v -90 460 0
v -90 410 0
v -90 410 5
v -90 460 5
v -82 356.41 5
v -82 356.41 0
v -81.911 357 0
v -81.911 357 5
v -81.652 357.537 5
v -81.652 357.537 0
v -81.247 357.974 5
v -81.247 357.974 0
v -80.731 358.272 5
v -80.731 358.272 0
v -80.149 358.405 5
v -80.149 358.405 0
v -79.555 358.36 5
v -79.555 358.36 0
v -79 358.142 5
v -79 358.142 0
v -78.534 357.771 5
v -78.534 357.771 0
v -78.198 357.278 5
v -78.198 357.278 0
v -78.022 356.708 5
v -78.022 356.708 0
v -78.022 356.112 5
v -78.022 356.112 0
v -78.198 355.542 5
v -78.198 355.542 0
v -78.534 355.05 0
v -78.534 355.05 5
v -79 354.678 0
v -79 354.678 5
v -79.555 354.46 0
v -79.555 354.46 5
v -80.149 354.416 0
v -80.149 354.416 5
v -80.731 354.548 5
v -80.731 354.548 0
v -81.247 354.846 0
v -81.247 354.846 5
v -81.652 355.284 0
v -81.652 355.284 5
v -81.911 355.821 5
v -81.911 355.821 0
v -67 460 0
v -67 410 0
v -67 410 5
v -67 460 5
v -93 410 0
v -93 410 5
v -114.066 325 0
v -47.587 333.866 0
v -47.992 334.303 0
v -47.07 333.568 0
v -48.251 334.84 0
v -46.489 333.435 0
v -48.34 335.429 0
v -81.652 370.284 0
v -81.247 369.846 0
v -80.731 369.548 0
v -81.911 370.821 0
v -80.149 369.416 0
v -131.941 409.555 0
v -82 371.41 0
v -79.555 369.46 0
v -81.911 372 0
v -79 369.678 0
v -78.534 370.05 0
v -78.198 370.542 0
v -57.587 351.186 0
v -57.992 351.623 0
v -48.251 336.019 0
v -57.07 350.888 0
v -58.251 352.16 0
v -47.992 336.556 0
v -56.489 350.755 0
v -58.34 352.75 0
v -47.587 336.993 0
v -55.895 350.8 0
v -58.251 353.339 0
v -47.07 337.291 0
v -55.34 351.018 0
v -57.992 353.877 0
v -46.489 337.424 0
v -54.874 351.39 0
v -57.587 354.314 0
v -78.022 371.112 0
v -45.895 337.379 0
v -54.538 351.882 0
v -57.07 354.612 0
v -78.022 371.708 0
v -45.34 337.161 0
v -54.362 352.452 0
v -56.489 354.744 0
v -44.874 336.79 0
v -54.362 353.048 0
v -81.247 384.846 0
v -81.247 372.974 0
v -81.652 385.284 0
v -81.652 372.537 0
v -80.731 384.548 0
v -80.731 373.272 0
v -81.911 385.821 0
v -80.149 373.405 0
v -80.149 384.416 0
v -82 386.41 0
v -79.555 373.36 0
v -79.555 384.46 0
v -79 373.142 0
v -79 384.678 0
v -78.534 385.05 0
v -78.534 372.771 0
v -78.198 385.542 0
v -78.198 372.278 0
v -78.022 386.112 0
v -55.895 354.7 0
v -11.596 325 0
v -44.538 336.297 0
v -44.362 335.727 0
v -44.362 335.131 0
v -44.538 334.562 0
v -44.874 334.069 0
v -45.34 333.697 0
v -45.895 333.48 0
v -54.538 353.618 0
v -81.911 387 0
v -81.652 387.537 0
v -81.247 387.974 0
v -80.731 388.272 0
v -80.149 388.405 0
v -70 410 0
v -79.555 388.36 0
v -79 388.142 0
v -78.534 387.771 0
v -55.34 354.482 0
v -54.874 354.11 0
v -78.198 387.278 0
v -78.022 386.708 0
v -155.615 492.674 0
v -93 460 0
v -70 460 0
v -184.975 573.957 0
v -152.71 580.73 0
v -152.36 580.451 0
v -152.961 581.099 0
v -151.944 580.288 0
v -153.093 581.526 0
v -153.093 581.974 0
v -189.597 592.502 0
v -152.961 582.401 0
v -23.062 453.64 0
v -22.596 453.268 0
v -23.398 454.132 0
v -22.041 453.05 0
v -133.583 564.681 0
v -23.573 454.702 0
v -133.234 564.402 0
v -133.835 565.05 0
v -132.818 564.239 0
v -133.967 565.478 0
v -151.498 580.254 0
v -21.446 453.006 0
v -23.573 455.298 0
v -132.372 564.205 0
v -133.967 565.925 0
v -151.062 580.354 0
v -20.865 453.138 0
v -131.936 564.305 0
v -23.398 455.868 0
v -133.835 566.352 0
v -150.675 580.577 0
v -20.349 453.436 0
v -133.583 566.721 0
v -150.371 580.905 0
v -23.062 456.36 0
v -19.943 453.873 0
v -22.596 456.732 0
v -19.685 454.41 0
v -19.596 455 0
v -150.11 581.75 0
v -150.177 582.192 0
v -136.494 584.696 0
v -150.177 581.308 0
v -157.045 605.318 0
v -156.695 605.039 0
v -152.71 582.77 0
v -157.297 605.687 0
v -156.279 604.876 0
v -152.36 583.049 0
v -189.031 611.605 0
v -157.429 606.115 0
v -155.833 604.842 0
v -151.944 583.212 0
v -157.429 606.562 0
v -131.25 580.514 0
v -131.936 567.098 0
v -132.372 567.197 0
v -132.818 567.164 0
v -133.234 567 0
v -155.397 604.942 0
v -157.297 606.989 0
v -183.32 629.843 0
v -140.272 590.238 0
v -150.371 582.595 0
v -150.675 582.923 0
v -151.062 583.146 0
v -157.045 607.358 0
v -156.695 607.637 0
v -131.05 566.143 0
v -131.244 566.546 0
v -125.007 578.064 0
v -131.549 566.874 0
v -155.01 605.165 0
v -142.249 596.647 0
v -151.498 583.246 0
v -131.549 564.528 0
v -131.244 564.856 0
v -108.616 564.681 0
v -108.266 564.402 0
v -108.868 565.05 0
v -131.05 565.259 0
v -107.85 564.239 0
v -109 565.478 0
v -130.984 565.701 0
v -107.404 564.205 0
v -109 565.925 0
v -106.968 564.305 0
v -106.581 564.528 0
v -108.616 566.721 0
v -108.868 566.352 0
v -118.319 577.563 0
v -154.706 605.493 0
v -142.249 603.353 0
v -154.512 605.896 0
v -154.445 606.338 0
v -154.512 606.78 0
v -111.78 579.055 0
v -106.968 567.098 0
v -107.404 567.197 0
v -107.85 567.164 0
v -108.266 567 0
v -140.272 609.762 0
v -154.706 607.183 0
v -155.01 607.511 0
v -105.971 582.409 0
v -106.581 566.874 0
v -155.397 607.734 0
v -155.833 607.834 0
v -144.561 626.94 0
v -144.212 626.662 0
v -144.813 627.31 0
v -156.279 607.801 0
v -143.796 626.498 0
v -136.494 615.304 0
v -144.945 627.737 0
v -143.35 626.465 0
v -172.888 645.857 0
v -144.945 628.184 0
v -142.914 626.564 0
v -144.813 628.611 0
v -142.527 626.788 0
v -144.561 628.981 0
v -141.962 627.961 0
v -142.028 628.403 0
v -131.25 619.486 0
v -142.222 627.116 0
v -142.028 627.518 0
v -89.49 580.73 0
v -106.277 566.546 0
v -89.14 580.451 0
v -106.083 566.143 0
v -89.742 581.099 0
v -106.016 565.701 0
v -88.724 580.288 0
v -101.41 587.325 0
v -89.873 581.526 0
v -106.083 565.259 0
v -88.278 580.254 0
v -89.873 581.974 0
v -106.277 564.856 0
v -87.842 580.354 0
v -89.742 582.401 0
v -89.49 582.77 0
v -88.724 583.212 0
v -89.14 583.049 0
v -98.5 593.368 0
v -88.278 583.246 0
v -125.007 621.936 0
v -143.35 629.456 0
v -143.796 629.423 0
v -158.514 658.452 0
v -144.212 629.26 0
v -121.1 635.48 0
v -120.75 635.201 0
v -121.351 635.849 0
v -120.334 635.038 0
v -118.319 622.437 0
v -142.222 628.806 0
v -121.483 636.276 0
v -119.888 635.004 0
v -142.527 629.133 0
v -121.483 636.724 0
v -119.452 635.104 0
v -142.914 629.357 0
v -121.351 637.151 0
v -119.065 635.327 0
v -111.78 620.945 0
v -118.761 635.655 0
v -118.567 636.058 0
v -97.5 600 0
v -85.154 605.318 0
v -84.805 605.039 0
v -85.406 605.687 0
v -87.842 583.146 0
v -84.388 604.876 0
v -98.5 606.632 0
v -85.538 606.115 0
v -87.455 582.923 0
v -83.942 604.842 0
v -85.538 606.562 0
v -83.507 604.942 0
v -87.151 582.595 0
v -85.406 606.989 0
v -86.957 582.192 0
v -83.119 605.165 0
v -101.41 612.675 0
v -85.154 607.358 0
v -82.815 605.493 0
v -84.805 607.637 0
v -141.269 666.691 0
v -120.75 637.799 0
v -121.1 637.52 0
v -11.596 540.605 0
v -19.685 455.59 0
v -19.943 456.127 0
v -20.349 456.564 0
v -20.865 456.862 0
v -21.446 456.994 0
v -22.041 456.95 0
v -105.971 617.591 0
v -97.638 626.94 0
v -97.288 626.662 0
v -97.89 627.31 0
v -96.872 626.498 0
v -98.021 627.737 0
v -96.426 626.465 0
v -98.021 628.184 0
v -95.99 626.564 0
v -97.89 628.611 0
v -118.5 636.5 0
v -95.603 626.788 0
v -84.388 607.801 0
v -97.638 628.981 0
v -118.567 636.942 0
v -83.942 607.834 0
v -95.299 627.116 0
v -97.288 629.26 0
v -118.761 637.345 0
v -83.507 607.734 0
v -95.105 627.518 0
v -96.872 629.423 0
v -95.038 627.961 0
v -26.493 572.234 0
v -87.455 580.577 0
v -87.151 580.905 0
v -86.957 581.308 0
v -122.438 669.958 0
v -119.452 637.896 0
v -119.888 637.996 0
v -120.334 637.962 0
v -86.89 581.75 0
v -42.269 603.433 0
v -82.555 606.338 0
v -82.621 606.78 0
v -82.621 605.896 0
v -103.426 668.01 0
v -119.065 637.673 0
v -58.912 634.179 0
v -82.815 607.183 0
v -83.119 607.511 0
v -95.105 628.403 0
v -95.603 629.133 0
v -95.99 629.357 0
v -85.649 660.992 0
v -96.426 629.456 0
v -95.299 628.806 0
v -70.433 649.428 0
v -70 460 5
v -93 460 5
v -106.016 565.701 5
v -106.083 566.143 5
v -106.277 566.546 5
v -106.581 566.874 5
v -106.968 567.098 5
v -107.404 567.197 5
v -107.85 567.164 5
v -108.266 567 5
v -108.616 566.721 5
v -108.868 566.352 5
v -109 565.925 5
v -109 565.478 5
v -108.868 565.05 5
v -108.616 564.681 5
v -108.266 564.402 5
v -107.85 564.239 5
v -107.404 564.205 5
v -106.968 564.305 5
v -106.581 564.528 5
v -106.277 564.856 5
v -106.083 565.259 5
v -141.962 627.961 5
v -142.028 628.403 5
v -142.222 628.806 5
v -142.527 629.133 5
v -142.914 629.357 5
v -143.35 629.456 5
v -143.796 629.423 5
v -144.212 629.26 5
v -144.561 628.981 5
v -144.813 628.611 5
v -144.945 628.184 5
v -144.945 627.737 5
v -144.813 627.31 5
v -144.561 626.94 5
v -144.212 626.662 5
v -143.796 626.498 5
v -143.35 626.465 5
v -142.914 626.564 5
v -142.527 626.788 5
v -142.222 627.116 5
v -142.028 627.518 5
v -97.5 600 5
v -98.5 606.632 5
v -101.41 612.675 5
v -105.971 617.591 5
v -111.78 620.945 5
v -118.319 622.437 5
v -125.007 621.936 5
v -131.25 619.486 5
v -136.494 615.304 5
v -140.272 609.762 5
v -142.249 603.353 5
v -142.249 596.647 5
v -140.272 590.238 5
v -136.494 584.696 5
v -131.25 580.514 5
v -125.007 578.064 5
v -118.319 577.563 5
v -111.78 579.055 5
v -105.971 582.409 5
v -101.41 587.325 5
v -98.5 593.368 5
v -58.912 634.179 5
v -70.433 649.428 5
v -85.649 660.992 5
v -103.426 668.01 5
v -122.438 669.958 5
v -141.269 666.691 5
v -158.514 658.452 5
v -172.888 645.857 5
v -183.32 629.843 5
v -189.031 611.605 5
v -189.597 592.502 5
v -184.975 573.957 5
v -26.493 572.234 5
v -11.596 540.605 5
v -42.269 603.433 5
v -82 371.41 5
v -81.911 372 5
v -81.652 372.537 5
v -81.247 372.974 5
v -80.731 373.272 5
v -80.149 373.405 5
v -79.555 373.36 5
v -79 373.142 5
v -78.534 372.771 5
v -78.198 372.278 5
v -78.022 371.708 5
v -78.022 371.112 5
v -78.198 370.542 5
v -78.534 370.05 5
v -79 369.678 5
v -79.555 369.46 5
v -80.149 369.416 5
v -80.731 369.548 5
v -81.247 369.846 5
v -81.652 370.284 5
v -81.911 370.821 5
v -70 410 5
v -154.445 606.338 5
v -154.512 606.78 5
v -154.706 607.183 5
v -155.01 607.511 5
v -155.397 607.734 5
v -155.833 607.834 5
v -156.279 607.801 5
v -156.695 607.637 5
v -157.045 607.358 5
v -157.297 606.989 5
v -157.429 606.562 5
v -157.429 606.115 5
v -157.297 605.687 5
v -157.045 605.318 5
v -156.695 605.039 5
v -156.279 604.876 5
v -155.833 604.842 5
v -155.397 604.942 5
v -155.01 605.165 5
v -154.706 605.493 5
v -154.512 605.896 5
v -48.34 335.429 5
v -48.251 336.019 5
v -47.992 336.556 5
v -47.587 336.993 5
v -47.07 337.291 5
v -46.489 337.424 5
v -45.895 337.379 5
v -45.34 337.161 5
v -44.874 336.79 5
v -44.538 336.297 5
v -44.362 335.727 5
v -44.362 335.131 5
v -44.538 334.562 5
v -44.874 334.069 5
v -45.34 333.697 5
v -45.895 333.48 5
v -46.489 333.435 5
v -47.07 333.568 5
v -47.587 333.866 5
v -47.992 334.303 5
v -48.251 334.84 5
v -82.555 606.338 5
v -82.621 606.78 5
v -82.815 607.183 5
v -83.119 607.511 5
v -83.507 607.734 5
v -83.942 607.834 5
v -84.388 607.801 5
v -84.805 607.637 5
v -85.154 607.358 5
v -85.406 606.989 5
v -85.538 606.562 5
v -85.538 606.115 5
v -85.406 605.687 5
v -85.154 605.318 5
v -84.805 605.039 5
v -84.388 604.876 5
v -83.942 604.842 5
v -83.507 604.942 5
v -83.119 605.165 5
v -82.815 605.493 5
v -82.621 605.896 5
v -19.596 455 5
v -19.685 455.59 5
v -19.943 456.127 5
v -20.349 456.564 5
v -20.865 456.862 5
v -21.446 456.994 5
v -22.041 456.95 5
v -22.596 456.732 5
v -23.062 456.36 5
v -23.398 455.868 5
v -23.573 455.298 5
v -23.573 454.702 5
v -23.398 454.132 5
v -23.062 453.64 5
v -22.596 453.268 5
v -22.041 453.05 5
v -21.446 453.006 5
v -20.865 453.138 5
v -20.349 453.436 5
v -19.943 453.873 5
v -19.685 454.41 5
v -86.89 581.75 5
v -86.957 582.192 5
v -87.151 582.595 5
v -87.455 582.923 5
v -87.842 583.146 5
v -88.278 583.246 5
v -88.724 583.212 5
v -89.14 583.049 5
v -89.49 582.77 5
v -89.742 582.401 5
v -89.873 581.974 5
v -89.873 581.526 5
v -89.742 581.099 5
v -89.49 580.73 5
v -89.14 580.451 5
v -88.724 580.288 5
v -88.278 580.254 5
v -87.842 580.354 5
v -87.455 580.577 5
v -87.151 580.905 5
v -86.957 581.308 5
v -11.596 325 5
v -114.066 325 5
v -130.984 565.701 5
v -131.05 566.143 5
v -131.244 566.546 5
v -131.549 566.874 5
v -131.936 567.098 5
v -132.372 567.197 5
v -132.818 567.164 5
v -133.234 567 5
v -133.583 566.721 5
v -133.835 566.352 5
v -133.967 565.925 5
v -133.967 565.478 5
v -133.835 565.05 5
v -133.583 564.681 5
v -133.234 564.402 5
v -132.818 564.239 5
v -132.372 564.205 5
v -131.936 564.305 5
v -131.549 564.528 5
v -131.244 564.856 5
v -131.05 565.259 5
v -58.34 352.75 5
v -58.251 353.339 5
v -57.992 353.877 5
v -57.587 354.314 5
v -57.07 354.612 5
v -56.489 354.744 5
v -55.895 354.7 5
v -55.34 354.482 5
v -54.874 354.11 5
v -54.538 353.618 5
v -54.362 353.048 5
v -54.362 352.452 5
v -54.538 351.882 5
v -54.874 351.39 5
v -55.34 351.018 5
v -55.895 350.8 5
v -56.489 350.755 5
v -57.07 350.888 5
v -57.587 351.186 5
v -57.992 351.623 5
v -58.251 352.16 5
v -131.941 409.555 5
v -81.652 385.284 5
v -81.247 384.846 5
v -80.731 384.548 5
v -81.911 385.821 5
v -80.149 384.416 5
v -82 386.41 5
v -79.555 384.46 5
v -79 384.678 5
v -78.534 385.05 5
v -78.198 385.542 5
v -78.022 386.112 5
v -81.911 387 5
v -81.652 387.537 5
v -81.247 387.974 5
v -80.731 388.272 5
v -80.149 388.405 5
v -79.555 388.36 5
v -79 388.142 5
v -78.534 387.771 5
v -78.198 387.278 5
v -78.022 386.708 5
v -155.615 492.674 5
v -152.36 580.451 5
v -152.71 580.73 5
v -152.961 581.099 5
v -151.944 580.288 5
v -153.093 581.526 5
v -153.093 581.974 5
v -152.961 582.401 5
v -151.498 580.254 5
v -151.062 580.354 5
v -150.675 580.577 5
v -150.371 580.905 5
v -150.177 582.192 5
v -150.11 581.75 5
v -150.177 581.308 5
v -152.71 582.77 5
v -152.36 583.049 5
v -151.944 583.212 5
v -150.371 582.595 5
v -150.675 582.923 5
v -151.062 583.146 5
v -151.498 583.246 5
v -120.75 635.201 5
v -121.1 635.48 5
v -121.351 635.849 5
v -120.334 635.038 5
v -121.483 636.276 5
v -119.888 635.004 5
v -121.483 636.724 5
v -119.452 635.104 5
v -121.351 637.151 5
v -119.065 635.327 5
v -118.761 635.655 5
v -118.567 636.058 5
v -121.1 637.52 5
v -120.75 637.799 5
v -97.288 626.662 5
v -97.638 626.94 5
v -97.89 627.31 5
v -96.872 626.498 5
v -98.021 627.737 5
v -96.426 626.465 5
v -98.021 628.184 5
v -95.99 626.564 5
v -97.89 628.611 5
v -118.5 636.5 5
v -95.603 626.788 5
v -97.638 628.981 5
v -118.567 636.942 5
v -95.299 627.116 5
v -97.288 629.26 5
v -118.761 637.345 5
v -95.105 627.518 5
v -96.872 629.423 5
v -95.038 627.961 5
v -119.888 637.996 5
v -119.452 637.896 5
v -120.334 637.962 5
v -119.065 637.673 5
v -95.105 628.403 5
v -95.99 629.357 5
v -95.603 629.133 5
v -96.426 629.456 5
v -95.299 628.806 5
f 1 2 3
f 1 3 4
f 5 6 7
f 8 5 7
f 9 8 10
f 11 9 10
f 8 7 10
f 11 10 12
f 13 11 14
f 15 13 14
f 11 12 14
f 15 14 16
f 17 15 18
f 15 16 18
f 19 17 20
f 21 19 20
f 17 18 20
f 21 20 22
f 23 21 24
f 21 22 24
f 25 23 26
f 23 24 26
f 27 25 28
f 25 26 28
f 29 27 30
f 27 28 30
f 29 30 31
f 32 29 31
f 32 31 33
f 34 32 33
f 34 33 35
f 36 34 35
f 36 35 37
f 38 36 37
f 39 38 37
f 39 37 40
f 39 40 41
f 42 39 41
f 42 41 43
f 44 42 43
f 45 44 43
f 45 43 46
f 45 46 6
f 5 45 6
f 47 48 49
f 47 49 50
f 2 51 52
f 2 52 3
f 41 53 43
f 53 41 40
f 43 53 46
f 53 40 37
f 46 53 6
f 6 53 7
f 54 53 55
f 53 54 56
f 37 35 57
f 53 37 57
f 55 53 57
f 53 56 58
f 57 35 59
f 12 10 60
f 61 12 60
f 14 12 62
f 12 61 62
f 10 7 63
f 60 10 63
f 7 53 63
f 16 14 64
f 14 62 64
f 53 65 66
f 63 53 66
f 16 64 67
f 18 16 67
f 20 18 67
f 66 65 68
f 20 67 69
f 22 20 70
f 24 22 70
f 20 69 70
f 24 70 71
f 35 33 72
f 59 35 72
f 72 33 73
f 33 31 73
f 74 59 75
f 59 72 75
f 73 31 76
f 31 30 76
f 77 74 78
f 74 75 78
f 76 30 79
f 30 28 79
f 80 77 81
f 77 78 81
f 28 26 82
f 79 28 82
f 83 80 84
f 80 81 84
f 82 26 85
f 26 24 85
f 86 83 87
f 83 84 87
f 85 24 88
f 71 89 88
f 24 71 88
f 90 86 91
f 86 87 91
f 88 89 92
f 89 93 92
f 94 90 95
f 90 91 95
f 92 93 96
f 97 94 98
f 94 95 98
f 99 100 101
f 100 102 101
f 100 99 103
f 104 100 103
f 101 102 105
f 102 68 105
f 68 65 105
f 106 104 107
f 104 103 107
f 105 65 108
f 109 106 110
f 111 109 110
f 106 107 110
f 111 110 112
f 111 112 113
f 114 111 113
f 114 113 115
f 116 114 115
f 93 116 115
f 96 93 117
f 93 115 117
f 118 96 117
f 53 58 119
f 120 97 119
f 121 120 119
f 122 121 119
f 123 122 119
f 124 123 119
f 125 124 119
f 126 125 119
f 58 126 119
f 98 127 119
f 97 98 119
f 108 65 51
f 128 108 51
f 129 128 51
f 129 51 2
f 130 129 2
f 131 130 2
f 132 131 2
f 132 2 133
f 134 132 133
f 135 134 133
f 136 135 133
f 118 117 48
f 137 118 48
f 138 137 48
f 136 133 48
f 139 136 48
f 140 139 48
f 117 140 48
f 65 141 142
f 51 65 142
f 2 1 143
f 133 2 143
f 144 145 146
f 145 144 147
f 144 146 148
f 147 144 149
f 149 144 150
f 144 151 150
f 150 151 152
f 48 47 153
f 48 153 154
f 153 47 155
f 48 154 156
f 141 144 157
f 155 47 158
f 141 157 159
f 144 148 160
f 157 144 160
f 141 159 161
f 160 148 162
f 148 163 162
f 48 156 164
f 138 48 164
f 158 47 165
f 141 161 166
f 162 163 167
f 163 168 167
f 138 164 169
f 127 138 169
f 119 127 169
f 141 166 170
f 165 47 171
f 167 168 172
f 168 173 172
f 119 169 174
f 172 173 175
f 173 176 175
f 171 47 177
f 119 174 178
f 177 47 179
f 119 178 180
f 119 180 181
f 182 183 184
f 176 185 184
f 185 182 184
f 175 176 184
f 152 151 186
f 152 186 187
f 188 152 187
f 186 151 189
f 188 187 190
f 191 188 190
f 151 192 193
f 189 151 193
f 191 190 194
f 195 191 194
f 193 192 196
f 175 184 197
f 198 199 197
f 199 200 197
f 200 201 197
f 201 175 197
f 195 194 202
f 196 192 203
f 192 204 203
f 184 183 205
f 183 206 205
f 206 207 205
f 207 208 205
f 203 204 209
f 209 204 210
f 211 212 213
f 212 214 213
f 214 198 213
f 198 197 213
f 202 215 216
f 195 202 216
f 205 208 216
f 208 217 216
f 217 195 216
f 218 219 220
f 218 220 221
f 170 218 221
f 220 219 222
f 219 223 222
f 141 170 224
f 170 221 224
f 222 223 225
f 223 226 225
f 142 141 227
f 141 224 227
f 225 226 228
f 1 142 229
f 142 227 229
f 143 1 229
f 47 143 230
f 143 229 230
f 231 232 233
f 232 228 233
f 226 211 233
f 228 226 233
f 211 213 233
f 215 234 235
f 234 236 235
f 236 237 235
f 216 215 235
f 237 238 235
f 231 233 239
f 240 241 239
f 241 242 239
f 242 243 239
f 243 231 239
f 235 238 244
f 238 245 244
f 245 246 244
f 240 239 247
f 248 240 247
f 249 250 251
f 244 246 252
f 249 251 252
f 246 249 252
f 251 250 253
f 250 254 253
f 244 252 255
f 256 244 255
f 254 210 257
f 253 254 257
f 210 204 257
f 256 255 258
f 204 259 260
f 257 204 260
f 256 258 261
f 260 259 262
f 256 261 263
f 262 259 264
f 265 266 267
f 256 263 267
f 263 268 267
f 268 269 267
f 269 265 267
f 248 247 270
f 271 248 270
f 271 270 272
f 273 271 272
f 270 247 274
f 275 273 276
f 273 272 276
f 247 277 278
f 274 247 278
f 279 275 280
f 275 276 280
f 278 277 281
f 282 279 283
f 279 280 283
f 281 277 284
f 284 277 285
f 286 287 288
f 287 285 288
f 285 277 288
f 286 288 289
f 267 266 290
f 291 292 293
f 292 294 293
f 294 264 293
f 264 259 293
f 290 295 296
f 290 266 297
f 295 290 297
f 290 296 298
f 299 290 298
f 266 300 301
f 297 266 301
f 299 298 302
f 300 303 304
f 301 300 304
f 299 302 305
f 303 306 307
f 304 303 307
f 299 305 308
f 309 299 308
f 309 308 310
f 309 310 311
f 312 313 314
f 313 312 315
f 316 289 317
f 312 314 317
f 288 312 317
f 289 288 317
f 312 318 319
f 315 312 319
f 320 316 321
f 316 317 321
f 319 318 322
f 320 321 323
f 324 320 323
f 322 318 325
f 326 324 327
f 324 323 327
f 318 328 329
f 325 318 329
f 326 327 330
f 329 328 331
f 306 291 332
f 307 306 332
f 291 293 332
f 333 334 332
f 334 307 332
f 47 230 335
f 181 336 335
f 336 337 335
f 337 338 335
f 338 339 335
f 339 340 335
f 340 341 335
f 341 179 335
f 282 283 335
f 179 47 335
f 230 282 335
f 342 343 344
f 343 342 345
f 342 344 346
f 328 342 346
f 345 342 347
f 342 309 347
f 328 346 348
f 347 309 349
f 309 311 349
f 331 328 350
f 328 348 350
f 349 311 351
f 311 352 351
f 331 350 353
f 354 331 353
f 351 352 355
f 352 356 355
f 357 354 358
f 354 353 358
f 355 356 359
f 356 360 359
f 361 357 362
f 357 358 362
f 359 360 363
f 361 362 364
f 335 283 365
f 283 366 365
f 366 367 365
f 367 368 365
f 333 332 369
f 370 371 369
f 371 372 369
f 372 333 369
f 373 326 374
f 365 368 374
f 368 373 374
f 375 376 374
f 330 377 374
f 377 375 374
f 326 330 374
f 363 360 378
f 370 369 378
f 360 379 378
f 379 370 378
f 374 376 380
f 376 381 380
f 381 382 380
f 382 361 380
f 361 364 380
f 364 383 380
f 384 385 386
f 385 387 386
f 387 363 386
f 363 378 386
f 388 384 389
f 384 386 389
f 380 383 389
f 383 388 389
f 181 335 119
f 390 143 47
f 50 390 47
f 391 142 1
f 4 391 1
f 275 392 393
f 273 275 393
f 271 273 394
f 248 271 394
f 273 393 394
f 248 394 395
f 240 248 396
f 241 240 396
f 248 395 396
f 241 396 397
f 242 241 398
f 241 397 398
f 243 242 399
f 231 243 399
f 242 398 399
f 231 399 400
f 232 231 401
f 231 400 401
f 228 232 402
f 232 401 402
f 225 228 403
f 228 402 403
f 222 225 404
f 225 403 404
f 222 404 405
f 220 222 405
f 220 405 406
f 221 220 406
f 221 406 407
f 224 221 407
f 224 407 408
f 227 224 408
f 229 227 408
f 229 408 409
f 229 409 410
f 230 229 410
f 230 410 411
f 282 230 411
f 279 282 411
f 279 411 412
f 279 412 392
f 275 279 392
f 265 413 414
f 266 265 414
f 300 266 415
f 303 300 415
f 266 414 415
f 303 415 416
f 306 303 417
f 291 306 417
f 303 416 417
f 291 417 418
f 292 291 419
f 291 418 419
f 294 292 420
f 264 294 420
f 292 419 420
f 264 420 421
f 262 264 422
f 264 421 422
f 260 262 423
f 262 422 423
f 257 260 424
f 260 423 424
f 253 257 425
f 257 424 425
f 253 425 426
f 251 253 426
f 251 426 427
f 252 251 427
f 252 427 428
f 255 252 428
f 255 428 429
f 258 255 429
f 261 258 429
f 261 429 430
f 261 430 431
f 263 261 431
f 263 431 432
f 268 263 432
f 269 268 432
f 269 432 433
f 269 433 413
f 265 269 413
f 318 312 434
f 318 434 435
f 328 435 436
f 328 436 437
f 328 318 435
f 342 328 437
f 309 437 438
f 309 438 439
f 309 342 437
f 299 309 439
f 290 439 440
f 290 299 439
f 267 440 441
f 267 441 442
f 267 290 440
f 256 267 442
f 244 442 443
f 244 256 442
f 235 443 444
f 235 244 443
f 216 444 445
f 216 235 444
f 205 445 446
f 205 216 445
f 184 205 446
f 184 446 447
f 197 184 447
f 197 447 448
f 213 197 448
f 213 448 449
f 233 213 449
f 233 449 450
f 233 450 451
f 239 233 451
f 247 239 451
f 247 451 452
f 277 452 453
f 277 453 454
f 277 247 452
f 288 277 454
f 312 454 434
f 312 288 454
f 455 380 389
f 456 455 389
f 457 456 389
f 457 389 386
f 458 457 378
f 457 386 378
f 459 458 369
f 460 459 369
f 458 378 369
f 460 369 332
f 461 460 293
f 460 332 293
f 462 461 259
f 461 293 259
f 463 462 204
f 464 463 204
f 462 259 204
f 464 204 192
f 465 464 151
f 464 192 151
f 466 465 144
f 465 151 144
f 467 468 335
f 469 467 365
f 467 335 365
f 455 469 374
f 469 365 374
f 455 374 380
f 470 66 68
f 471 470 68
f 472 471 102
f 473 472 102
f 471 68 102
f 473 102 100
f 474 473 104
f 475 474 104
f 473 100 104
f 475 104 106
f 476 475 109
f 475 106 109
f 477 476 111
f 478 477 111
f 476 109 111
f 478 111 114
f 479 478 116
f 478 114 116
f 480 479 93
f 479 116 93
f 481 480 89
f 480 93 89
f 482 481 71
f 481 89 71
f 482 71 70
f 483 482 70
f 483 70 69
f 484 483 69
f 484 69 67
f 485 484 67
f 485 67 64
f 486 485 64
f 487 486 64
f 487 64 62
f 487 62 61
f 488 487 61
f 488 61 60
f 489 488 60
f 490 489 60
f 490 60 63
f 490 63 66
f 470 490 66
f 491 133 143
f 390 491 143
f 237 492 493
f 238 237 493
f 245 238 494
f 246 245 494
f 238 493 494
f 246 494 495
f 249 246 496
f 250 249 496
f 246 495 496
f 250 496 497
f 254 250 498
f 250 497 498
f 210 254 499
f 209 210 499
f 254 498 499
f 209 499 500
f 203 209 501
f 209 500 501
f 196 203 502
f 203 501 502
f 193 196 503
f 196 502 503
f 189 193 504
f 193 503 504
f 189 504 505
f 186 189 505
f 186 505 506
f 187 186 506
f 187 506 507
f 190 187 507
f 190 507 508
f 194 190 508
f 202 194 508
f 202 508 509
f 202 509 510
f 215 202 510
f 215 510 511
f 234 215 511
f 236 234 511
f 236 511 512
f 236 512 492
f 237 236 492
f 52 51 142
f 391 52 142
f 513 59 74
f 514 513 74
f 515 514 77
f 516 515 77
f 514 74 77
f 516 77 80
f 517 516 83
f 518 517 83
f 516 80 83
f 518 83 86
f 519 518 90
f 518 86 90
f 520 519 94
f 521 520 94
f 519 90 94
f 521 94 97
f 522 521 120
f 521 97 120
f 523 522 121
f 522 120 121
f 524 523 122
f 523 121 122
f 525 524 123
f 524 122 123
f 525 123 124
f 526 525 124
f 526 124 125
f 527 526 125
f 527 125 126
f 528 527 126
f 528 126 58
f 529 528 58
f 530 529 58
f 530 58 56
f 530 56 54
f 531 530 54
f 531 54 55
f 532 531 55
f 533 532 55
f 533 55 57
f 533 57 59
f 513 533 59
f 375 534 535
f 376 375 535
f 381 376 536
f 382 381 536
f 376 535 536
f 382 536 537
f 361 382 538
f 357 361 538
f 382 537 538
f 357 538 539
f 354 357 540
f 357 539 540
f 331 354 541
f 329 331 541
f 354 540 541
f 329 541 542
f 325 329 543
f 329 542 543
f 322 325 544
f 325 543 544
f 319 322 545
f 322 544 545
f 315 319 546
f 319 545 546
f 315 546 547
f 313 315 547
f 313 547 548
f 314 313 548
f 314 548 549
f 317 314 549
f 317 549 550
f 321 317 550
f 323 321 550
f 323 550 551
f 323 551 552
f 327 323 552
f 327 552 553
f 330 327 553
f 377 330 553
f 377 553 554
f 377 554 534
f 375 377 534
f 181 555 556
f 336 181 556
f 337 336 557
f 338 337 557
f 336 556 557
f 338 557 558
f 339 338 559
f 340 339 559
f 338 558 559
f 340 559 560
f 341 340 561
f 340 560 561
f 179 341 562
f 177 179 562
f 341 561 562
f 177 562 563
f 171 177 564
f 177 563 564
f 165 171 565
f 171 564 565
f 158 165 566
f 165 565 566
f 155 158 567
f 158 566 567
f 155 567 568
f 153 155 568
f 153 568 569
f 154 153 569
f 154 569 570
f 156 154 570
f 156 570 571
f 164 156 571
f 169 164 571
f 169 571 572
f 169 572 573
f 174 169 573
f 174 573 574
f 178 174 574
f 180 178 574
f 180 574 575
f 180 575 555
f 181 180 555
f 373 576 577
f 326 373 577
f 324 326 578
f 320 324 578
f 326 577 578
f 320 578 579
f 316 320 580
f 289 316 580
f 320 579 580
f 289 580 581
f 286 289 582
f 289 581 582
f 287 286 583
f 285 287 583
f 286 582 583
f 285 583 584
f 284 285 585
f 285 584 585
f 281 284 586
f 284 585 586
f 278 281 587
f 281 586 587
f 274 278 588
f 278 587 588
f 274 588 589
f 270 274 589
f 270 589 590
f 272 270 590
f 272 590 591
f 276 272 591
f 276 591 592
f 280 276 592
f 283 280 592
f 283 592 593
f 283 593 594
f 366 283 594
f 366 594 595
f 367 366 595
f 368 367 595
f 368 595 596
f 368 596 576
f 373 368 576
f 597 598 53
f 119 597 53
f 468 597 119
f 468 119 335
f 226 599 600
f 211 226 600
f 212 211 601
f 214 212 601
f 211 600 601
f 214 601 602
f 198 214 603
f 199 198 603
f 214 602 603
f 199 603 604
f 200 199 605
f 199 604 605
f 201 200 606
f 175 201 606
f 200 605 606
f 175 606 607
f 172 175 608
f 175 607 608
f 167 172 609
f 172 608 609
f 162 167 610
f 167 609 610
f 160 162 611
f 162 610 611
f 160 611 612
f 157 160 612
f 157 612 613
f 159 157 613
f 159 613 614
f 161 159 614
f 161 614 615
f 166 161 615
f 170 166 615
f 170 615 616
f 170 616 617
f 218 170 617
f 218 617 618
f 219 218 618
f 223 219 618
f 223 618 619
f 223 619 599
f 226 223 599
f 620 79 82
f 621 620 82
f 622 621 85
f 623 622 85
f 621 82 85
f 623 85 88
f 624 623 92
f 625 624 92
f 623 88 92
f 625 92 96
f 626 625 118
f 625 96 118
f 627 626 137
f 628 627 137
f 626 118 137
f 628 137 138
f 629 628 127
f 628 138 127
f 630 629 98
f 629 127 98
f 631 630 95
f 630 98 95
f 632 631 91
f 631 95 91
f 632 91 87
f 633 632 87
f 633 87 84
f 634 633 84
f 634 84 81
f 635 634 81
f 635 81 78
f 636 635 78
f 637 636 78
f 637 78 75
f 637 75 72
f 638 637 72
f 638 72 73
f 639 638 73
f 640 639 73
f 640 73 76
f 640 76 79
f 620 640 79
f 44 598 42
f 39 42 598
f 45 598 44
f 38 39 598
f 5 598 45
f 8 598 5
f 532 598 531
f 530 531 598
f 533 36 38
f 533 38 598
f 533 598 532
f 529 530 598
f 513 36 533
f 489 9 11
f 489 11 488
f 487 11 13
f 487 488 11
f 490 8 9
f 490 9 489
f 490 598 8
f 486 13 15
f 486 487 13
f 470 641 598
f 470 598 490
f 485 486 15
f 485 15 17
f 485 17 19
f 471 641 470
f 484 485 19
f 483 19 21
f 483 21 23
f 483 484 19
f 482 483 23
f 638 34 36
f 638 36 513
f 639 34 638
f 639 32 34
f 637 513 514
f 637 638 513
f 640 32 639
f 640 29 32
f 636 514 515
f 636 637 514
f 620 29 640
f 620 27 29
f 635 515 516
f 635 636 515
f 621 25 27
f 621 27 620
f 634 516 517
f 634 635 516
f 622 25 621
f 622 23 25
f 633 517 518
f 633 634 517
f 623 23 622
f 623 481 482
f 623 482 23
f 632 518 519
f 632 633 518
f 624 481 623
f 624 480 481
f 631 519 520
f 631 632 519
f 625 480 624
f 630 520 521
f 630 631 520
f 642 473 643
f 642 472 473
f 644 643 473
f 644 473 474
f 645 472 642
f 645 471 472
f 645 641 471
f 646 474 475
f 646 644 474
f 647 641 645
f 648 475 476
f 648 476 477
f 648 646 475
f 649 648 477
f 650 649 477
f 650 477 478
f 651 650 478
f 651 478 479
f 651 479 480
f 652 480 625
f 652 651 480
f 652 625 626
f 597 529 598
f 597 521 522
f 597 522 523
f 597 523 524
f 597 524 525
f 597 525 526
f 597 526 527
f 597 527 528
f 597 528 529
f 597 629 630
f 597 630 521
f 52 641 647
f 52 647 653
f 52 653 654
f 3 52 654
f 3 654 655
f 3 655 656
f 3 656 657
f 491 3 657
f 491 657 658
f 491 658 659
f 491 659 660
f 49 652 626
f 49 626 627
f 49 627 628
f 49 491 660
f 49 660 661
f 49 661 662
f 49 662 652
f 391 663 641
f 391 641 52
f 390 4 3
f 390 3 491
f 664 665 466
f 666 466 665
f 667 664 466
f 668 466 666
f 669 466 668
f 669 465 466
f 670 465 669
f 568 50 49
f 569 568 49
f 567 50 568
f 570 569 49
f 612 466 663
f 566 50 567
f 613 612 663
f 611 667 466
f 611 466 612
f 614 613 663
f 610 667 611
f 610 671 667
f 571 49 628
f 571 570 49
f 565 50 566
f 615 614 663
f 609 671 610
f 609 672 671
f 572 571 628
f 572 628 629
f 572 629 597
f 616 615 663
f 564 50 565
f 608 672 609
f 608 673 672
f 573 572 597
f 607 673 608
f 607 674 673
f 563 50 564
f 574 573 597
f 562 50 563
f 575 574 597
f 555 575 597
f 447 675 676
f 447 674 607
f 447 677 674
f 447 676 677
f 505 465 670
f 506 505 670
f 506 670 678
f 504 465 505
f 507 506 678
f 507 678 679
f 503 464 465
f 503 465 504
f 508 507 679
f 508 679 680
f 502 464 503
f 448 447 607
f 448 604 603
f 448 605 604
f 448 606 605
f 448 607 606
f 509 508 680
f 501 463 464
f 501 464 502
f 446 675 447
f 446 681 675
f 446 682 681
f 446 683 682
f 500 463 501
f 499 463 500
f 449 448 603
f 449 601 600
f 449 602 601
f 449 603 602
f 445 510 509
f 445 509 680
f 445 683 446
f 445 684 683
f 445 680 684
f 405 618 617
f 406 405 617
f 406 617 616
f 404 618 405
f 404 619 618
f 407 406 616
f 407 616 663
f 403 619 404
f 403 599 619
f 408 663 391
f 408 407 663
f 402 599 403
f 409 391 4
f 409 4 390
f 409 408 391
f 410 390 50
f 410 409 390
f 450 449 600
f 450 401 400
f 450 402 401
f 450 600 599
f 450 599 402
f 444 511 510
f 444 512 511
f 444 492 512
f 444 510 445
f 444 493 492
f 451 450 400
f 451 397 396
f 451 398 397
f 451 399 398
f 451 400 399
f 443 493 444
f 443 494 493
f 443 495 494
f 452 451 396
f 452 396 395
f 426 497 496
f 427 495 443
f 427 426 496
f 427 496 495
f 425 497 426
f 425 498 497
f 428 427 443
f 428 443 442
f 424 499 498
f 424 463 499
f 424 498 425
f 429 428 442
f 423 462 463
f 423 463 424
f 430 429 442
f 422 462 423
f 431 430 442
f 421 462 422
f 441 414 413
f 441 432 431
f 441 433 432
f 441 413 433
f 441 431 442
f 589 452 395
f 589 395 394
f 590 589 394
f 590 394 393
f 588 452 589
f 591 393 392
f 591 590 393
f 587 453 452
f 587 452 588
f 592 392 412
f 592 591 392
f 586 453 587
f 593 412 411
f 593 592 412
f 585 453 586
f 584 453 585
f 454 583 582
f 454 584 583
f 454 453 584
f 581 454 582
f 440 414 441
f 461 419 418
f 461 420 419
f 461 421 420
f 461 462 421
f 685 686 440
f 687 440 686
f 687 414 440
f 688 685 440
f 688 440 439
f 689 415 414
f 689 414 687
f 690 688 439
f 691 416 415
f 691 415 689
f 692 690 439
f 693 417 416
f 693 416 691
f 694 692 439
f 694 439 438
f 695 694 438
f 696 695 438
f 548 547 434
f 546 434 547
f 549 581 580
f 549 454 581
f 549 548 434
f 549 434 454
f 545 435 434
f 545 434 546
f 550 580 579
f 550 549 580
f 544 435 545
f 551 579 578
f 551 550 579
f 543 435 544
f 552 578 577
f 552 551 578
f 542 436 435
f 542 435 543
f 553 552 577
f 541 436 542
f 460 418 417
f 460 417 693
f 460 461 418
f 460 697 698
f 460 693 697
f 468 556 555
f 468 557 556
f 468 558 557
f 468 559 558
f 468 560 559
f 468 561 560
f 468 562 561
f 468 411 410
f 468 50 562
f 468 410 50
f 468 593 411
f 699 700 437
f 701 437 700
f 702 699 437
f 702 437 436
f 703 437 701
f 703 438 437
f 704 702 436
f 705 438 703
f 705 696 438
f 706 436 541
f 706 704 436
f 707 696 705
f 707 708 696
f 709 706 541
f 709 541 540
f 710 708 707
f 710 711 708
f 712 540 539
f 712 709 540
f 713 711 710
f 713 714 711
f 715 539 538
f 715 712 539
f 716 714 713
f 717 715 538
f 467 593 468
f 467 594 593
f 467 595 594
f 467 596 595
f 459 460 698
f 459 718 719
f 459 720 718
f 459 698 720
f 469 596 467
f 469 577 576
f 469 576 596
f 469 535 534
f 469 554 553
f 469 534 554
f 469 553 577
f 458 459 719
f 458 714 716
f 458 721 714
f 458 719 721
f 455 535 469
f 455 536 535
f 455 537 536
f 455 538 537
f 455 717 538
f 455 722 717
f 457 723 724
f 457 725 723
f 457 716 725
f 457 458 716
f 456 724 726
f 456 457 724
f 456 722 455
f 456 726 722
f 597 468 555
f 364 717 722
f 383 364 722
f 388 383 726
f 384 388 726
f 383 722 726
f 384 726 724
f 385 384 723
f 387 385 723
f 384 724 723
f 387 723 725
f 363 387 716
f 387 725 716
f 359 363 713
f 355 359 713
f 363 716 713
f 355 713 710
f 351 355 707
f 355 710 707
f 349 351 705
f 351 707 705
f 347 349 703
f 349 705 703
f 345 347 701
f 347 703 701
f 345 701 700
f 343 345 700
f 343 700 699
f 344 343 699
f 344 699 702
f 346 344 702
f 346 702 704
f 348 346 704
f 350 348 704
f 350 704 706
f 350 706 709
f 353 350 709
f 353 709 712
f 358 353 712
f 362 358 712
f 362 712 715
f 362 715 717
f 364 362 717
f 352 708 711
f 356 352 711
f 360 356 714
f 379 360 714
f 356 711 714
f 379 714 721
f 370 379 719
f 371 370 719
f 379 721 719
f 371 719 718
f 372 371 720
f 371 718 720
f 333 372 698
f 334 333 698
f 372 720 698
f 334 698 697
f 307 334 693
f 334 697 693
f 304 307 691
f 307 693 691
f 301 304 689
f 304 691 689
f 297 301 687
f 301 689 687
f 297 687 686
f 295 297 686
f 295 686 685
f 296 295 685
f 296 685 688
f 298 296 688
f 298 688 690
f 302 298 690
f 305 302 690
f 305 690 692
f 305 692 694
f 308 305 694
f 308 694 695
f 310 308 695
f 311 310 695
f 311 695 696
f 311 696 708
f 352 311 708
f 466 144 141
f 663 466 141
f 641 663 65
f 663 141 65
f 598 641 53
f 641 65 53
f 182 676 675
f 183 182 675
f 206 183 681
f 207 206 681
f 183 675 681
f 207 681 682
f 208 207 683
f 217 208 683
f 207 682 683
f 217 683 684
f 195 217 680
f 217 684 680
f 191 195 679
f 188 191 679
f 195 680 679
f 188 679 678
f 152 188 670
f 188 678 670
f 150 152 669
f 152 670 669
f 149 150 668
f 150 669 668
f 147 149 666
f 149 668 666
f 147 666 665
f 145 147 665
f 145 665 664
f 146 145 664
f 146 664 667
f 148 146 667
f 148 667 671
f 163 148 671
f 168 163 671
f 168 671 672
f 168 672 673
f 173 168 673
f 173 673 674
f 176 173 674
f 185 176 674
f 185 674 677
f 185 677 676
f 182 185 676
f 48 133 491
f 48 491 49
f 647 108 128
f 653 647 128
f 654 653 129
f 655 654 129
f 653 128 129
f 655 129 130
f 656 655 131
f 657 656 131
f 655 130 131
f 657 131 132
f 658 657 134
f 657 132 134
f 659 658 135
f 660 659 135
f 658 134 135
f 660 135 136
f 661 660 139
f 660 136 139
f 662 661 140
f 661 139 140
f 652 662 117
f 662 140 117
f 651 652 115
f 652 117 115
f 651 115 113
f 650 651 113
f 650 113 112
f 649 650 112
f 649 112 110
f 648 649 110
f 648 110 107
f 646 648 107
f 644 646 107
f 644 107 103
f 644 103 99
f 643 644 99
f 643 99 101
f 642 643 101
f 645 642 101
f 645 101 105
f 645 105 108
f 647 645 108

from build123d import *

# Parameters (mm, degrees)
SKETCH_1_R          = 2
SKETCH_1_W          = 3
SKETCH_1_H          = 50
SKETCH_1_R_2        = 70
SKETCH_1_R_3        = 22.5
EXTRUDE_1_DEPTH     = 5
SKETCH_2_R          = 2
CUT_EXTRUDE_1_DEPTH = 697.437362582
SKETCH_3_R          = 1.5
CUT_EXTRUDE_2_DEPTH = 697.437362582
SKETCH_4_R          = 2
CUT_EXTRUDE_3_DEPTH = 10


with BuildPart() as part:
    # 草图1 → 凸台-拉伸1 (new body)
    # profile 1 of 2: a face of its own
    with BuildSketch(Plane.XY):
        with BuildLine():
            ThreePointArc((-184.975195398, 573.957266214), (-108.724882678, 291.977251427), (-100, 0))
            Line((-100, 0), (-100, -10))
            Line((-100, -10), (-91, -10))
            Line((-91, -10), (-91, 11))
            Line((-91, 11), (-69, 11))
            Line((-69, 11), (-69, -10))
            Line((-69, -10), (100, -10))
            Line((100, -10), (100, 0))
            ThreePointArc((100, 0), (62.740102222, 327.663103245), (-58.911784918, 634.179379428))
            ThreePointArc((-58.911784918, 634.179379428), (-52.264577008, 617.661043914), (-50, 600))
            ThreePointArc((-50, 600), (-106.738470636, 531.267679808), (-184.975195398, 573.957266214))
        make_face()
        with Locations((-50, 0)):
            Circle(SKETCH_1_R, mode=Mode.SUBTRACT)
        Circle(SKETCH_1_R, mode=Mode.SUBTRACT)
        with Locations((50, 0)):
            Circle(SKETCH_1_R, mode=Mode.SUBTRACT)
        with Locations((-91.5, 435)):
            Rectangle(SKETCH_1_W, SKETCH_1_H, mode=Mode.SUBTRACT)
        with Locations((-68.5, 435)):
            Rectangle(SKETCH_1_W, SKETCH_1_H, mode=Mode.SUBTRACT)
    # profile 2 of 2: a face of its own
    with BuildSketch(Plane.XY):
        with Locations((-120, 600)):
            Circle(SKETCH_1_R_2)
        with Locations((-120, 600)):
            Circle(SKETCH_1_R_3, mode=Mode.SUBTRACT)
    extrude(amount=EXTRUDE_1_DEPTH)

    # 草图2 → 切除-拉伸1 (cut, through all)
    with BuildSketch(Plane(origin=(0, 0, 0), x_dir=(-1, 0, 0), z_dir=(0, 0, -1))):
        with Locations((80, 386.410161514)):
            Circle(SKETCH_2_R)
        with Locations((80, 371.410161514)):
            Circle(SKETCH_2_R)
        with Locations((80, 356.410161514)):
            Circle(SKETCH_2_R)
        with Locations((56.339745962, 352.749907476)):
            Circle(SKETCH_2_R)
        with Locations((46.339745962, 335.4293994)):
            Circle(SKETCH_2_R)
        with Locations((26.339745962, 300.788383249)):
            Circle(SKETCH_2_R)
        with Locations((6.339745962, 266.147367097)):
            Circle(SKETCH_2_R)
        with Locations((-13.660254038, 231.506350946)):
            Circle(SKETCH_2_R)
        with Locations((80, 76.410161514)):
            Circle(SKETCH_2_R)
        with Locations((80, 116.410161514)):
            Circle(SKETCH_2_R)
        with Locations((80, 236.410161514)):
            Circle(SKETCH_2_R)
        with Locations((80, 276.410161514)):
            Circle(SKETCH_2_R)
        with Locations((80, 316.410161514)):
            Circle(SKETCH_2_R)
    extrude(amount=-CUT_EXTRUDE_1_DEPTH, mode=Mode.SUBTRACT)

    # 草图3 → 切除-拉伸2 (cut, through all)
    with BuildSketch(Plane.XY.offset(5)):
        with Locations((-120, 636.5)):
            Circle(SKETCH_3_R)
        with Locations((-96.538252246, 627.960622174)):
            Circle(SKETCH_3_R)
        with Locations((-84.054517015, 606.338158485)):
            Circle(SKETCH_3_R)
        with Locations((-88.390072762, 581.75)):
            Circle(SKETCH_3_R)
        with Locations((-107.516264769, 565.701219341)):
            Circle(SKETCH_3_R)
        with Locations((-132.483735231, 565.701219341)):
            Circle(SKETCH_3_R)
        with Locations((-151.609927238, 581.75)):
            Circle(SKETCH_3_R)
        with Locations((-155.945482985, 606.338158485)):
            Circle(SKETCH_3_R)
        with Locations((-143.461747754, 627.960622174)):
            Circle(SKETCH_3_R)
    extrude(amount=-CUT_EXTRUDE_2_DEPTH, mode=Mode.SUBTRACT)


with BuildPart() as body_2:
    # Split Bodies 1: the piece on the far side of the plane
    add(part.part)
    split(bisect_by=Plane(origin=(0, 325, 0), x_dir=(0, 0, -1), z_dir=(0, -1, 0)), keep=Keep.BOTTOM)

    # 草图4 → 切除-拉伸3 (cut)
    with BuildSketch(Plane.XY.offset(5)):
        with Locations((-21.595687559, 455)):
            Circle(SKETCH_4_R)
        with BuildLine():
            Line((-11.595687559, 325), (-11.595687559, 540.604962521))
            ThreePointArc((-11.595687559, 540.604962521), (30.836385122, 434.518144234), (63.404312441, 325))
            Line((63.404312441, 325), (-11.595687559, 325))
        make_face()
    extrude(amount=-CUT_EXTRUDE_3_DEPTH, mode=Mode.SUBTRACT)


with BuildPart() as part_1:
    add(part.part)

    # Split Bodies 1
    split(bisect_by=Plane(origin=(0, 325, 0), x_dir=(0, 0, -1), z_dir=(0, -1, 0)), keep=Keep.TOP)


solid = body_2.part
